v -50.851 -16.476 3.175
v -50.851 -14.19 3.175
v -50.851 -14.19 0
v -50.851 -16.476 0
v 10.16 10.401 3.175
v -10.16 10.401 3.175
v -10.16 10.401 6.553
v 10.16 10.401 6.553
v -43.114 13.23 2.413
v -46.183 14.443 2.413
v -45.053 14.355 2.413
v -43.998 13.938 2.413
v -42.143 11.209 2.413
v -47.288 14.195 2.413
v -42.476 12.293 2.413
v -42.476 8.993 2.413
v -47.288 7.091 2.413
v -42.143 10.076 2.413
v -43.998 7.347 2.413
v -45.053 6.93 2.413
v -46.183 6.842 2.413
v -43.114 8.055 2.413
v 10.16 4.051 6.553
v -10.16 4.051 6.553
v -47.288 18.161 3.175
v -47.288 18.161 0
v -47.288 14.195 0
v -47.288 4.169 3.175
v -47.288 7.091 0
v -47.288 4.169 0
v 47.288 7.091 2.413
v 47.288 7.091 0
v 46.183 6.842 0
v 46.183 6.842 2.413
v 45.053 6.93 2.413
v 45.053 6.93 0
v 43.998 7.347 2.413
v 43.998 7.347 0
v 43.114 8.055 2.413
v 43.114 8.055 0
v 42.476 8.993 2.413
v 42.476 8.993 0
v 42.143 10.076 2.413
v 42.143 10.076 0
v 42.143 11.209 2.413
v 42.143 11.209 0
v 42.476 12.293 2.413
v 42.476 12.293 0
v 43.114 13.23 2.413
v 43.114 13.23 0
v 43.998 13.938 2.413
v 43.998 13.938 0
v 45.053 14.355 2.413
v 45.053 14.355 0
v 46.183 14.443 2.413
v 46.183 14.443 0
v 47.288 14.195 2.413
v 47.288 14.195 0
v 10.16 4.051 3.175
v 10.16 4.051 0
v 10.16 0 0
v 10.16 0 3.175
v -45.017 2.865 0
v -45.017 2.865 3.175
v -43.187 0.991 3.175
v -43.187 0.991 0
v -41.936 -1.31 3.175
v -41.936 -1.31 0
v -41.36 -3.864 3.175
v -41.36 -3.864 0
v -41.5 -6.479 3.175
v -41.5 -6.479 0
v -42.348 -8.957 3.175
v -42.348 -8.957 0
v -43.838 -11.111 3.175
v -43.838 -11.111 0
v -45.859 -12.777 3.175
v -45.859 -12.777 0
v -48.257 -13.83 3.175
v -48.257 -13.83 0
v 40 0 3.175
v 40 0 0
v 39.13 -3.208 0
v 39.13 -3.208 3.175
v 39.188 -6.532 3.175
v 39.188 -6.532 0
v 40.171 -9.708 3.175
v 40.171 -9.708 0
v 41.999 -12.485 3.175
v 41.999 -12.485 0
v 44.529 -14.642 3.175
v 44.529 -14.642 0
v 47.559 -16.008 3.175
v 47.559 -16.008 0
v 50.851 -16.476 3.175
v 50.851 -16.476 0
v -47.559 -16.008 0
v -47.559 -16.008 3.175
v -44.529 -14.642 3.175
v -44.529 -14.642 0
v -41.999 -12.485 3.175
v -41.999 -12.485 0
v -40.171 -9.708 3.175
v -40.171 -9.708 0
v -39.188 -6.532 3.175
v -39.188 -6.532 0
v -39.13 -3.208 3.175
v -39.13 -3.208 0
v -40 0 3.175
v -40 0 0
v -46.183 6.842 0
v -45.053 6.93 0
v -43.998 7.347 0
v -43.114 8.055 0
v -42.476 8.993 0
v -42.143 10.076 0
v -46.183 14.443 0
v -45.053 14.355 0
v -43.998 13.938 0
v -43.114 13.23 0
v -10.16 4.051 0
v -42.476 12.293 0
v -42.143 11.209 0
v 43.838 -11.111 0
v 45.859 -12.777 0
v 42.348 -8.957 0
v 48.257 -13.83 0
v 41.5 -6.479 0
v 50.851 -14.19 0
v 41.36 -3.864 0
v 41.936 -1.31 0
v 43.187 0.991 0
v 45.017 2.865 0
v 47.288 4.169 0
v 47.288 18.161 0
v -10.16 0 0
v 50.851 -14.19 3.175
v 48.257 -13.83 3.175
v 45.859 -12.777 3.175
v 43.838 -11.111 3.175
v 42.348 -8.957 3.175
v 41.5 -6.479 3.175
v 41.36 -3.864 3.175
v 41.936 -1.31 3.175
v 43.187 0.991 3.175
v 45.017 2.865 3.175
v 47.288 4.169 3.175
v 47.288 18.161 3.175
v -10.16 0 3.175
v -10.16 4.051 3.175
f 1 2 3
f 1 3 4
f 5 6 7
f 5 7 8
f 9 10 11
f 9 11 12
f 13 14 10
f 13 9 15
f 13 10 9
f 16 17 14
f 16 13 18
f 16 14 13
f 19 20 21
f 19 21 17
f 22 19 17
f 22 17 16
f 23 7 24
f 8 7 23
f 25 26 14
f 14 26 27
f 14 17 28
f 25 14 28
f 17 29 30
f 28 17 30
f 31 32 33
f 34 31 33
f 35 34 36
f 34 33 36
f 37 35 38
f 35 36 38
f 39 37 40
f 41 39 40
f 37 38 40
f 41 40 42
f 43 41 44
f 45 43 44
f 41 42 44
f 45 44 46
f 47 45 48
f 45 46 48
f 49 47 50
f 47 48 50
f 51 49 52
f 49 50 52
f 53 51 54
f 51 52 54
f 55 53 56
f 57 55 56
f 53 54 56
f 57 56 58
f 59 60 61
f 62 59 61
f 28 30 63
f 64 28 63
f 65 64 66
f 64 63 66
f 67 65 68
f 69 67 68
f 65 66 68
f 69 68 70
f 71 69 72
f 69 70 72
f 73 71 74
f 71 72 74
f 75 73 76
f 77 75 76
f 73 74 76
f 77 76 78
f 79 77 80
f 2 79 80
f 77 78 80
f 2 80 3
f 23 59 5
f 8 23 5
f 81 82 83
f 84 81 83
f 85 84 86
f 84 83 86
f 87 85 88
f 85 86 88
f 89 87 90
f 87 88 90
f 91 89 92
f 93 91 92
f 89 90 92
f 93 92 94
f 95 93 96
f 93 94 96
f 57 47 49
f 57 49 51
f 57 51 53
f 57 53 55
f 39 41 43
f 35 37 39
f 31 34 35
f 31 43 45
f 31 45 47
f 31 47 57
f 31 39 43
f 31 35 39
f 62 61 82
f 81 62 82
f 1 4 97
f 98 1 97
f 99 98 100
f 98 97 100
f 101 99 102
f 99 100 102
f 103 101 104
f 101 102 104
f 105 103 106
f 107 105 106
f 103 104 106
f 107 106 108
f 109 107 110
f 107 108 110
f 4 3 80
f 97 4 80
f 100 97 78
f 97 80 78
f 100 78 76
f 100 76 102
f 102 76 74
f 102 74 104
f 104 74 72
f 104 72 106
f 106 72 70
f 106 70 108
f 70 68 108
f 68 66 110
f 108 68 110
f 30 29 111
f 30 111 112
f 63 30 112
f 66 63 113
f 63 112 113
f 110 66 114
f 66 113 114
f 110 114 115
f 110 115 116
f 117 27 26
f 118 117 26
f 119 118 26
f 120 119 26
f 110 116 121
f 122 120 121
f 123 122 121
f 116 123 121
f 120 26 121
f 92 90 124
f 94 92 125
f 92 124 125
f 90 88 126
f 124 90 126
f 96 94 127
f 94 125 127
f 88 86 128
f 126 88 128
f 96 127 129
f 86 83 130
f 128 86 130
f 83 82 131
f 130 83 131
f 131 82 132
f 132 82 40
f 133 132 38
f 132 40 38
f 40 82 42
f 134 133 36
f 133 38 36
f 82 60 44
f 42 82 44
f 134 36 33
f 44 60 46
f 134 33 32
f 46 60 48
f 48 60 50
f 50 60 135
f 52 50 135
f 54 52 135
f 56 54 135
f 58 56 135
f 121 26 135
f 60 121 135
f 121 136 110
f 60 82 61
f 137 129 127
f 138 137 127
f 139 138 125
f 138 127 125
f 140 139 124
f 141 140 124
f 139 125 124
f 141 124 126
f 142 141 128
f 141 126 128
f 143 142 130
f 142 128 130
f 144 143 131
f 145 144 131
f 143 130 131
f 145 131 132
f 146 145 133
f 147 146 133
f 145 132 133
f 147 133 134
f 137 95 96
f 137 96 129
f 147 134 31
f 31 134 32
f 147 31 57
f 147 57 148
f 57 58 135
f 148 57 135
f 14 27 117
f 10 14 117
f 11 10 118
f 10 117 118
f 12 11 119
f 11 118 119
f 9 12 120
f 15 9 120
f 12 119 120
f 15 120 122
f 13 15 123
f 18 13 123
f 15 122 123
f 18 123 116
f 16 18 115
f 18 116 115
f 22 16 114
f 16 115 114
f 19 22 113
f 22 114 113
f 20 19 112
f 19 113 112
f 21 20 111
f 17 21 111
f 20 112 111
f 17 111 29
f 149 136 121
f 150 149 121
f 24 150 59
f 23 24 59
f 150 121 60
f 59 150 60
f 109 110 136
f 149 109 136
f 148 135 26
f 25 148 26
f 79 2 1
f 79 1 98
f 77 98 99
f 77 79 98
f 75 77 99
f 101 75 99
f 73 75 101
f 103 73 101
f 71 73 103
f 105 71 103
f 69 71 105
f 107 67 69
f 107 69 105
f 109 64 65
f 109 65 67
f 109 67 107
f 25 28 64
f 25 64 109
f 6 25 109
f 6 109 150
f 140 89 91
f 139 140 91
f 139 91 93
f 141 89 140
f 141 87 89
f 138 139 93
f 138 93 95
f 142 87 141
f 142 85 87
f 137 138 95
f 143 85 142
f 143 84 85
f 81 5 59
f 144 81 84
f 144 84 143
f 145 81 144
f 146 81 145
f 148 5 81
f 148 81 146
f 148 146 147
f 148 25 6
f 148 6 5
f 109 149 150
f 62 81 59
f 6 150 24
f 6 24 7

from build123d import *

# Parameters (mm, degrees)
F1_DEPTH = 3.175
F3_DEPTH = 2.413
F4_W     = 20.32
F4_H     = 6.35
F5_DEPTH = 3.3782


with BuildPart() as f1:
    # F0 (on Top) → F1 (new body)
    with BuildSketch(Plane.XY):
        with BuildLine():
            Line((47.28845, 18.161), (-47.28845, 18.161))
            Line((-47.28845, 18.161), (-47.28845, 4.168868))
            ThreePointArc((-47.28845, 4.168868), (-41.500207, -6.479288), (-50.8508, -14.189891))
            Line((-50.8508, -14.189891), (-50.8508, -16.475891))
            ThreePointArc((-50.8508, -16.475891), (-40.986806, -11.161147), (-40.000062, 0))
            Line((-40.000062, 0), (-10.16, 0))
            Line((-10.16, 0), (-10.16, 4.0513))
            Line((-10.16, 4.0513), (10.16, 4.0513))
            Line((10.16, 4.0513), (10.16, 0))
            Line((10.16, 0), (40.000062, 0))
            ThreePointArc((40.000062, 0), (40.986806, -11.161147), (50.8508, -16.475891))
            Line((50.8508, -16.475891), (50.8508, -14.189891))
            ThreePointArc((50.8508, -14.189891), (41.500207, -6.479288), (47.28845, 4.168868))
            Line((47.28845, 4.168868), (47.28845, 18.161))
        make_face()
    extrude(amount=F1_DEPTH)

    # F2 (on face) → F3 (cut)
    with BuildSketch(Plane(origin=(0, 0, 0), x_dir=(1, 0, 0), z_dir=(0, 0, -1))):
        with BuildLine():
            Line((-47.28845, -7.090509), (-47.28845, -14.194691))
            ThreePointArc((-47.28845, -14.194691), (-42.1005, -10.6426), (-47.28845, -7.090509))
        make_face()
        with BuildLine():
            ThreePointArc((47.28845, -7.090509), (42.1005, -10.6426), (47.28845, -14.194691))
            Line((47.28845, -14.194691), (47.28845, -7.090509))
        make_face()
    extrude(amount=-F3_DEPTH, mode=Mode.SUBTRACT)

    # F4 (on face) → F5 (join)
    with BuildSketch(Plane.XY.offset(3.175)):
        with Locations((0, 7.2263)):
            Rectangle(F4_W, F4_H)
    extrude(amount=F5_DEPTH)


solid = f1.part
